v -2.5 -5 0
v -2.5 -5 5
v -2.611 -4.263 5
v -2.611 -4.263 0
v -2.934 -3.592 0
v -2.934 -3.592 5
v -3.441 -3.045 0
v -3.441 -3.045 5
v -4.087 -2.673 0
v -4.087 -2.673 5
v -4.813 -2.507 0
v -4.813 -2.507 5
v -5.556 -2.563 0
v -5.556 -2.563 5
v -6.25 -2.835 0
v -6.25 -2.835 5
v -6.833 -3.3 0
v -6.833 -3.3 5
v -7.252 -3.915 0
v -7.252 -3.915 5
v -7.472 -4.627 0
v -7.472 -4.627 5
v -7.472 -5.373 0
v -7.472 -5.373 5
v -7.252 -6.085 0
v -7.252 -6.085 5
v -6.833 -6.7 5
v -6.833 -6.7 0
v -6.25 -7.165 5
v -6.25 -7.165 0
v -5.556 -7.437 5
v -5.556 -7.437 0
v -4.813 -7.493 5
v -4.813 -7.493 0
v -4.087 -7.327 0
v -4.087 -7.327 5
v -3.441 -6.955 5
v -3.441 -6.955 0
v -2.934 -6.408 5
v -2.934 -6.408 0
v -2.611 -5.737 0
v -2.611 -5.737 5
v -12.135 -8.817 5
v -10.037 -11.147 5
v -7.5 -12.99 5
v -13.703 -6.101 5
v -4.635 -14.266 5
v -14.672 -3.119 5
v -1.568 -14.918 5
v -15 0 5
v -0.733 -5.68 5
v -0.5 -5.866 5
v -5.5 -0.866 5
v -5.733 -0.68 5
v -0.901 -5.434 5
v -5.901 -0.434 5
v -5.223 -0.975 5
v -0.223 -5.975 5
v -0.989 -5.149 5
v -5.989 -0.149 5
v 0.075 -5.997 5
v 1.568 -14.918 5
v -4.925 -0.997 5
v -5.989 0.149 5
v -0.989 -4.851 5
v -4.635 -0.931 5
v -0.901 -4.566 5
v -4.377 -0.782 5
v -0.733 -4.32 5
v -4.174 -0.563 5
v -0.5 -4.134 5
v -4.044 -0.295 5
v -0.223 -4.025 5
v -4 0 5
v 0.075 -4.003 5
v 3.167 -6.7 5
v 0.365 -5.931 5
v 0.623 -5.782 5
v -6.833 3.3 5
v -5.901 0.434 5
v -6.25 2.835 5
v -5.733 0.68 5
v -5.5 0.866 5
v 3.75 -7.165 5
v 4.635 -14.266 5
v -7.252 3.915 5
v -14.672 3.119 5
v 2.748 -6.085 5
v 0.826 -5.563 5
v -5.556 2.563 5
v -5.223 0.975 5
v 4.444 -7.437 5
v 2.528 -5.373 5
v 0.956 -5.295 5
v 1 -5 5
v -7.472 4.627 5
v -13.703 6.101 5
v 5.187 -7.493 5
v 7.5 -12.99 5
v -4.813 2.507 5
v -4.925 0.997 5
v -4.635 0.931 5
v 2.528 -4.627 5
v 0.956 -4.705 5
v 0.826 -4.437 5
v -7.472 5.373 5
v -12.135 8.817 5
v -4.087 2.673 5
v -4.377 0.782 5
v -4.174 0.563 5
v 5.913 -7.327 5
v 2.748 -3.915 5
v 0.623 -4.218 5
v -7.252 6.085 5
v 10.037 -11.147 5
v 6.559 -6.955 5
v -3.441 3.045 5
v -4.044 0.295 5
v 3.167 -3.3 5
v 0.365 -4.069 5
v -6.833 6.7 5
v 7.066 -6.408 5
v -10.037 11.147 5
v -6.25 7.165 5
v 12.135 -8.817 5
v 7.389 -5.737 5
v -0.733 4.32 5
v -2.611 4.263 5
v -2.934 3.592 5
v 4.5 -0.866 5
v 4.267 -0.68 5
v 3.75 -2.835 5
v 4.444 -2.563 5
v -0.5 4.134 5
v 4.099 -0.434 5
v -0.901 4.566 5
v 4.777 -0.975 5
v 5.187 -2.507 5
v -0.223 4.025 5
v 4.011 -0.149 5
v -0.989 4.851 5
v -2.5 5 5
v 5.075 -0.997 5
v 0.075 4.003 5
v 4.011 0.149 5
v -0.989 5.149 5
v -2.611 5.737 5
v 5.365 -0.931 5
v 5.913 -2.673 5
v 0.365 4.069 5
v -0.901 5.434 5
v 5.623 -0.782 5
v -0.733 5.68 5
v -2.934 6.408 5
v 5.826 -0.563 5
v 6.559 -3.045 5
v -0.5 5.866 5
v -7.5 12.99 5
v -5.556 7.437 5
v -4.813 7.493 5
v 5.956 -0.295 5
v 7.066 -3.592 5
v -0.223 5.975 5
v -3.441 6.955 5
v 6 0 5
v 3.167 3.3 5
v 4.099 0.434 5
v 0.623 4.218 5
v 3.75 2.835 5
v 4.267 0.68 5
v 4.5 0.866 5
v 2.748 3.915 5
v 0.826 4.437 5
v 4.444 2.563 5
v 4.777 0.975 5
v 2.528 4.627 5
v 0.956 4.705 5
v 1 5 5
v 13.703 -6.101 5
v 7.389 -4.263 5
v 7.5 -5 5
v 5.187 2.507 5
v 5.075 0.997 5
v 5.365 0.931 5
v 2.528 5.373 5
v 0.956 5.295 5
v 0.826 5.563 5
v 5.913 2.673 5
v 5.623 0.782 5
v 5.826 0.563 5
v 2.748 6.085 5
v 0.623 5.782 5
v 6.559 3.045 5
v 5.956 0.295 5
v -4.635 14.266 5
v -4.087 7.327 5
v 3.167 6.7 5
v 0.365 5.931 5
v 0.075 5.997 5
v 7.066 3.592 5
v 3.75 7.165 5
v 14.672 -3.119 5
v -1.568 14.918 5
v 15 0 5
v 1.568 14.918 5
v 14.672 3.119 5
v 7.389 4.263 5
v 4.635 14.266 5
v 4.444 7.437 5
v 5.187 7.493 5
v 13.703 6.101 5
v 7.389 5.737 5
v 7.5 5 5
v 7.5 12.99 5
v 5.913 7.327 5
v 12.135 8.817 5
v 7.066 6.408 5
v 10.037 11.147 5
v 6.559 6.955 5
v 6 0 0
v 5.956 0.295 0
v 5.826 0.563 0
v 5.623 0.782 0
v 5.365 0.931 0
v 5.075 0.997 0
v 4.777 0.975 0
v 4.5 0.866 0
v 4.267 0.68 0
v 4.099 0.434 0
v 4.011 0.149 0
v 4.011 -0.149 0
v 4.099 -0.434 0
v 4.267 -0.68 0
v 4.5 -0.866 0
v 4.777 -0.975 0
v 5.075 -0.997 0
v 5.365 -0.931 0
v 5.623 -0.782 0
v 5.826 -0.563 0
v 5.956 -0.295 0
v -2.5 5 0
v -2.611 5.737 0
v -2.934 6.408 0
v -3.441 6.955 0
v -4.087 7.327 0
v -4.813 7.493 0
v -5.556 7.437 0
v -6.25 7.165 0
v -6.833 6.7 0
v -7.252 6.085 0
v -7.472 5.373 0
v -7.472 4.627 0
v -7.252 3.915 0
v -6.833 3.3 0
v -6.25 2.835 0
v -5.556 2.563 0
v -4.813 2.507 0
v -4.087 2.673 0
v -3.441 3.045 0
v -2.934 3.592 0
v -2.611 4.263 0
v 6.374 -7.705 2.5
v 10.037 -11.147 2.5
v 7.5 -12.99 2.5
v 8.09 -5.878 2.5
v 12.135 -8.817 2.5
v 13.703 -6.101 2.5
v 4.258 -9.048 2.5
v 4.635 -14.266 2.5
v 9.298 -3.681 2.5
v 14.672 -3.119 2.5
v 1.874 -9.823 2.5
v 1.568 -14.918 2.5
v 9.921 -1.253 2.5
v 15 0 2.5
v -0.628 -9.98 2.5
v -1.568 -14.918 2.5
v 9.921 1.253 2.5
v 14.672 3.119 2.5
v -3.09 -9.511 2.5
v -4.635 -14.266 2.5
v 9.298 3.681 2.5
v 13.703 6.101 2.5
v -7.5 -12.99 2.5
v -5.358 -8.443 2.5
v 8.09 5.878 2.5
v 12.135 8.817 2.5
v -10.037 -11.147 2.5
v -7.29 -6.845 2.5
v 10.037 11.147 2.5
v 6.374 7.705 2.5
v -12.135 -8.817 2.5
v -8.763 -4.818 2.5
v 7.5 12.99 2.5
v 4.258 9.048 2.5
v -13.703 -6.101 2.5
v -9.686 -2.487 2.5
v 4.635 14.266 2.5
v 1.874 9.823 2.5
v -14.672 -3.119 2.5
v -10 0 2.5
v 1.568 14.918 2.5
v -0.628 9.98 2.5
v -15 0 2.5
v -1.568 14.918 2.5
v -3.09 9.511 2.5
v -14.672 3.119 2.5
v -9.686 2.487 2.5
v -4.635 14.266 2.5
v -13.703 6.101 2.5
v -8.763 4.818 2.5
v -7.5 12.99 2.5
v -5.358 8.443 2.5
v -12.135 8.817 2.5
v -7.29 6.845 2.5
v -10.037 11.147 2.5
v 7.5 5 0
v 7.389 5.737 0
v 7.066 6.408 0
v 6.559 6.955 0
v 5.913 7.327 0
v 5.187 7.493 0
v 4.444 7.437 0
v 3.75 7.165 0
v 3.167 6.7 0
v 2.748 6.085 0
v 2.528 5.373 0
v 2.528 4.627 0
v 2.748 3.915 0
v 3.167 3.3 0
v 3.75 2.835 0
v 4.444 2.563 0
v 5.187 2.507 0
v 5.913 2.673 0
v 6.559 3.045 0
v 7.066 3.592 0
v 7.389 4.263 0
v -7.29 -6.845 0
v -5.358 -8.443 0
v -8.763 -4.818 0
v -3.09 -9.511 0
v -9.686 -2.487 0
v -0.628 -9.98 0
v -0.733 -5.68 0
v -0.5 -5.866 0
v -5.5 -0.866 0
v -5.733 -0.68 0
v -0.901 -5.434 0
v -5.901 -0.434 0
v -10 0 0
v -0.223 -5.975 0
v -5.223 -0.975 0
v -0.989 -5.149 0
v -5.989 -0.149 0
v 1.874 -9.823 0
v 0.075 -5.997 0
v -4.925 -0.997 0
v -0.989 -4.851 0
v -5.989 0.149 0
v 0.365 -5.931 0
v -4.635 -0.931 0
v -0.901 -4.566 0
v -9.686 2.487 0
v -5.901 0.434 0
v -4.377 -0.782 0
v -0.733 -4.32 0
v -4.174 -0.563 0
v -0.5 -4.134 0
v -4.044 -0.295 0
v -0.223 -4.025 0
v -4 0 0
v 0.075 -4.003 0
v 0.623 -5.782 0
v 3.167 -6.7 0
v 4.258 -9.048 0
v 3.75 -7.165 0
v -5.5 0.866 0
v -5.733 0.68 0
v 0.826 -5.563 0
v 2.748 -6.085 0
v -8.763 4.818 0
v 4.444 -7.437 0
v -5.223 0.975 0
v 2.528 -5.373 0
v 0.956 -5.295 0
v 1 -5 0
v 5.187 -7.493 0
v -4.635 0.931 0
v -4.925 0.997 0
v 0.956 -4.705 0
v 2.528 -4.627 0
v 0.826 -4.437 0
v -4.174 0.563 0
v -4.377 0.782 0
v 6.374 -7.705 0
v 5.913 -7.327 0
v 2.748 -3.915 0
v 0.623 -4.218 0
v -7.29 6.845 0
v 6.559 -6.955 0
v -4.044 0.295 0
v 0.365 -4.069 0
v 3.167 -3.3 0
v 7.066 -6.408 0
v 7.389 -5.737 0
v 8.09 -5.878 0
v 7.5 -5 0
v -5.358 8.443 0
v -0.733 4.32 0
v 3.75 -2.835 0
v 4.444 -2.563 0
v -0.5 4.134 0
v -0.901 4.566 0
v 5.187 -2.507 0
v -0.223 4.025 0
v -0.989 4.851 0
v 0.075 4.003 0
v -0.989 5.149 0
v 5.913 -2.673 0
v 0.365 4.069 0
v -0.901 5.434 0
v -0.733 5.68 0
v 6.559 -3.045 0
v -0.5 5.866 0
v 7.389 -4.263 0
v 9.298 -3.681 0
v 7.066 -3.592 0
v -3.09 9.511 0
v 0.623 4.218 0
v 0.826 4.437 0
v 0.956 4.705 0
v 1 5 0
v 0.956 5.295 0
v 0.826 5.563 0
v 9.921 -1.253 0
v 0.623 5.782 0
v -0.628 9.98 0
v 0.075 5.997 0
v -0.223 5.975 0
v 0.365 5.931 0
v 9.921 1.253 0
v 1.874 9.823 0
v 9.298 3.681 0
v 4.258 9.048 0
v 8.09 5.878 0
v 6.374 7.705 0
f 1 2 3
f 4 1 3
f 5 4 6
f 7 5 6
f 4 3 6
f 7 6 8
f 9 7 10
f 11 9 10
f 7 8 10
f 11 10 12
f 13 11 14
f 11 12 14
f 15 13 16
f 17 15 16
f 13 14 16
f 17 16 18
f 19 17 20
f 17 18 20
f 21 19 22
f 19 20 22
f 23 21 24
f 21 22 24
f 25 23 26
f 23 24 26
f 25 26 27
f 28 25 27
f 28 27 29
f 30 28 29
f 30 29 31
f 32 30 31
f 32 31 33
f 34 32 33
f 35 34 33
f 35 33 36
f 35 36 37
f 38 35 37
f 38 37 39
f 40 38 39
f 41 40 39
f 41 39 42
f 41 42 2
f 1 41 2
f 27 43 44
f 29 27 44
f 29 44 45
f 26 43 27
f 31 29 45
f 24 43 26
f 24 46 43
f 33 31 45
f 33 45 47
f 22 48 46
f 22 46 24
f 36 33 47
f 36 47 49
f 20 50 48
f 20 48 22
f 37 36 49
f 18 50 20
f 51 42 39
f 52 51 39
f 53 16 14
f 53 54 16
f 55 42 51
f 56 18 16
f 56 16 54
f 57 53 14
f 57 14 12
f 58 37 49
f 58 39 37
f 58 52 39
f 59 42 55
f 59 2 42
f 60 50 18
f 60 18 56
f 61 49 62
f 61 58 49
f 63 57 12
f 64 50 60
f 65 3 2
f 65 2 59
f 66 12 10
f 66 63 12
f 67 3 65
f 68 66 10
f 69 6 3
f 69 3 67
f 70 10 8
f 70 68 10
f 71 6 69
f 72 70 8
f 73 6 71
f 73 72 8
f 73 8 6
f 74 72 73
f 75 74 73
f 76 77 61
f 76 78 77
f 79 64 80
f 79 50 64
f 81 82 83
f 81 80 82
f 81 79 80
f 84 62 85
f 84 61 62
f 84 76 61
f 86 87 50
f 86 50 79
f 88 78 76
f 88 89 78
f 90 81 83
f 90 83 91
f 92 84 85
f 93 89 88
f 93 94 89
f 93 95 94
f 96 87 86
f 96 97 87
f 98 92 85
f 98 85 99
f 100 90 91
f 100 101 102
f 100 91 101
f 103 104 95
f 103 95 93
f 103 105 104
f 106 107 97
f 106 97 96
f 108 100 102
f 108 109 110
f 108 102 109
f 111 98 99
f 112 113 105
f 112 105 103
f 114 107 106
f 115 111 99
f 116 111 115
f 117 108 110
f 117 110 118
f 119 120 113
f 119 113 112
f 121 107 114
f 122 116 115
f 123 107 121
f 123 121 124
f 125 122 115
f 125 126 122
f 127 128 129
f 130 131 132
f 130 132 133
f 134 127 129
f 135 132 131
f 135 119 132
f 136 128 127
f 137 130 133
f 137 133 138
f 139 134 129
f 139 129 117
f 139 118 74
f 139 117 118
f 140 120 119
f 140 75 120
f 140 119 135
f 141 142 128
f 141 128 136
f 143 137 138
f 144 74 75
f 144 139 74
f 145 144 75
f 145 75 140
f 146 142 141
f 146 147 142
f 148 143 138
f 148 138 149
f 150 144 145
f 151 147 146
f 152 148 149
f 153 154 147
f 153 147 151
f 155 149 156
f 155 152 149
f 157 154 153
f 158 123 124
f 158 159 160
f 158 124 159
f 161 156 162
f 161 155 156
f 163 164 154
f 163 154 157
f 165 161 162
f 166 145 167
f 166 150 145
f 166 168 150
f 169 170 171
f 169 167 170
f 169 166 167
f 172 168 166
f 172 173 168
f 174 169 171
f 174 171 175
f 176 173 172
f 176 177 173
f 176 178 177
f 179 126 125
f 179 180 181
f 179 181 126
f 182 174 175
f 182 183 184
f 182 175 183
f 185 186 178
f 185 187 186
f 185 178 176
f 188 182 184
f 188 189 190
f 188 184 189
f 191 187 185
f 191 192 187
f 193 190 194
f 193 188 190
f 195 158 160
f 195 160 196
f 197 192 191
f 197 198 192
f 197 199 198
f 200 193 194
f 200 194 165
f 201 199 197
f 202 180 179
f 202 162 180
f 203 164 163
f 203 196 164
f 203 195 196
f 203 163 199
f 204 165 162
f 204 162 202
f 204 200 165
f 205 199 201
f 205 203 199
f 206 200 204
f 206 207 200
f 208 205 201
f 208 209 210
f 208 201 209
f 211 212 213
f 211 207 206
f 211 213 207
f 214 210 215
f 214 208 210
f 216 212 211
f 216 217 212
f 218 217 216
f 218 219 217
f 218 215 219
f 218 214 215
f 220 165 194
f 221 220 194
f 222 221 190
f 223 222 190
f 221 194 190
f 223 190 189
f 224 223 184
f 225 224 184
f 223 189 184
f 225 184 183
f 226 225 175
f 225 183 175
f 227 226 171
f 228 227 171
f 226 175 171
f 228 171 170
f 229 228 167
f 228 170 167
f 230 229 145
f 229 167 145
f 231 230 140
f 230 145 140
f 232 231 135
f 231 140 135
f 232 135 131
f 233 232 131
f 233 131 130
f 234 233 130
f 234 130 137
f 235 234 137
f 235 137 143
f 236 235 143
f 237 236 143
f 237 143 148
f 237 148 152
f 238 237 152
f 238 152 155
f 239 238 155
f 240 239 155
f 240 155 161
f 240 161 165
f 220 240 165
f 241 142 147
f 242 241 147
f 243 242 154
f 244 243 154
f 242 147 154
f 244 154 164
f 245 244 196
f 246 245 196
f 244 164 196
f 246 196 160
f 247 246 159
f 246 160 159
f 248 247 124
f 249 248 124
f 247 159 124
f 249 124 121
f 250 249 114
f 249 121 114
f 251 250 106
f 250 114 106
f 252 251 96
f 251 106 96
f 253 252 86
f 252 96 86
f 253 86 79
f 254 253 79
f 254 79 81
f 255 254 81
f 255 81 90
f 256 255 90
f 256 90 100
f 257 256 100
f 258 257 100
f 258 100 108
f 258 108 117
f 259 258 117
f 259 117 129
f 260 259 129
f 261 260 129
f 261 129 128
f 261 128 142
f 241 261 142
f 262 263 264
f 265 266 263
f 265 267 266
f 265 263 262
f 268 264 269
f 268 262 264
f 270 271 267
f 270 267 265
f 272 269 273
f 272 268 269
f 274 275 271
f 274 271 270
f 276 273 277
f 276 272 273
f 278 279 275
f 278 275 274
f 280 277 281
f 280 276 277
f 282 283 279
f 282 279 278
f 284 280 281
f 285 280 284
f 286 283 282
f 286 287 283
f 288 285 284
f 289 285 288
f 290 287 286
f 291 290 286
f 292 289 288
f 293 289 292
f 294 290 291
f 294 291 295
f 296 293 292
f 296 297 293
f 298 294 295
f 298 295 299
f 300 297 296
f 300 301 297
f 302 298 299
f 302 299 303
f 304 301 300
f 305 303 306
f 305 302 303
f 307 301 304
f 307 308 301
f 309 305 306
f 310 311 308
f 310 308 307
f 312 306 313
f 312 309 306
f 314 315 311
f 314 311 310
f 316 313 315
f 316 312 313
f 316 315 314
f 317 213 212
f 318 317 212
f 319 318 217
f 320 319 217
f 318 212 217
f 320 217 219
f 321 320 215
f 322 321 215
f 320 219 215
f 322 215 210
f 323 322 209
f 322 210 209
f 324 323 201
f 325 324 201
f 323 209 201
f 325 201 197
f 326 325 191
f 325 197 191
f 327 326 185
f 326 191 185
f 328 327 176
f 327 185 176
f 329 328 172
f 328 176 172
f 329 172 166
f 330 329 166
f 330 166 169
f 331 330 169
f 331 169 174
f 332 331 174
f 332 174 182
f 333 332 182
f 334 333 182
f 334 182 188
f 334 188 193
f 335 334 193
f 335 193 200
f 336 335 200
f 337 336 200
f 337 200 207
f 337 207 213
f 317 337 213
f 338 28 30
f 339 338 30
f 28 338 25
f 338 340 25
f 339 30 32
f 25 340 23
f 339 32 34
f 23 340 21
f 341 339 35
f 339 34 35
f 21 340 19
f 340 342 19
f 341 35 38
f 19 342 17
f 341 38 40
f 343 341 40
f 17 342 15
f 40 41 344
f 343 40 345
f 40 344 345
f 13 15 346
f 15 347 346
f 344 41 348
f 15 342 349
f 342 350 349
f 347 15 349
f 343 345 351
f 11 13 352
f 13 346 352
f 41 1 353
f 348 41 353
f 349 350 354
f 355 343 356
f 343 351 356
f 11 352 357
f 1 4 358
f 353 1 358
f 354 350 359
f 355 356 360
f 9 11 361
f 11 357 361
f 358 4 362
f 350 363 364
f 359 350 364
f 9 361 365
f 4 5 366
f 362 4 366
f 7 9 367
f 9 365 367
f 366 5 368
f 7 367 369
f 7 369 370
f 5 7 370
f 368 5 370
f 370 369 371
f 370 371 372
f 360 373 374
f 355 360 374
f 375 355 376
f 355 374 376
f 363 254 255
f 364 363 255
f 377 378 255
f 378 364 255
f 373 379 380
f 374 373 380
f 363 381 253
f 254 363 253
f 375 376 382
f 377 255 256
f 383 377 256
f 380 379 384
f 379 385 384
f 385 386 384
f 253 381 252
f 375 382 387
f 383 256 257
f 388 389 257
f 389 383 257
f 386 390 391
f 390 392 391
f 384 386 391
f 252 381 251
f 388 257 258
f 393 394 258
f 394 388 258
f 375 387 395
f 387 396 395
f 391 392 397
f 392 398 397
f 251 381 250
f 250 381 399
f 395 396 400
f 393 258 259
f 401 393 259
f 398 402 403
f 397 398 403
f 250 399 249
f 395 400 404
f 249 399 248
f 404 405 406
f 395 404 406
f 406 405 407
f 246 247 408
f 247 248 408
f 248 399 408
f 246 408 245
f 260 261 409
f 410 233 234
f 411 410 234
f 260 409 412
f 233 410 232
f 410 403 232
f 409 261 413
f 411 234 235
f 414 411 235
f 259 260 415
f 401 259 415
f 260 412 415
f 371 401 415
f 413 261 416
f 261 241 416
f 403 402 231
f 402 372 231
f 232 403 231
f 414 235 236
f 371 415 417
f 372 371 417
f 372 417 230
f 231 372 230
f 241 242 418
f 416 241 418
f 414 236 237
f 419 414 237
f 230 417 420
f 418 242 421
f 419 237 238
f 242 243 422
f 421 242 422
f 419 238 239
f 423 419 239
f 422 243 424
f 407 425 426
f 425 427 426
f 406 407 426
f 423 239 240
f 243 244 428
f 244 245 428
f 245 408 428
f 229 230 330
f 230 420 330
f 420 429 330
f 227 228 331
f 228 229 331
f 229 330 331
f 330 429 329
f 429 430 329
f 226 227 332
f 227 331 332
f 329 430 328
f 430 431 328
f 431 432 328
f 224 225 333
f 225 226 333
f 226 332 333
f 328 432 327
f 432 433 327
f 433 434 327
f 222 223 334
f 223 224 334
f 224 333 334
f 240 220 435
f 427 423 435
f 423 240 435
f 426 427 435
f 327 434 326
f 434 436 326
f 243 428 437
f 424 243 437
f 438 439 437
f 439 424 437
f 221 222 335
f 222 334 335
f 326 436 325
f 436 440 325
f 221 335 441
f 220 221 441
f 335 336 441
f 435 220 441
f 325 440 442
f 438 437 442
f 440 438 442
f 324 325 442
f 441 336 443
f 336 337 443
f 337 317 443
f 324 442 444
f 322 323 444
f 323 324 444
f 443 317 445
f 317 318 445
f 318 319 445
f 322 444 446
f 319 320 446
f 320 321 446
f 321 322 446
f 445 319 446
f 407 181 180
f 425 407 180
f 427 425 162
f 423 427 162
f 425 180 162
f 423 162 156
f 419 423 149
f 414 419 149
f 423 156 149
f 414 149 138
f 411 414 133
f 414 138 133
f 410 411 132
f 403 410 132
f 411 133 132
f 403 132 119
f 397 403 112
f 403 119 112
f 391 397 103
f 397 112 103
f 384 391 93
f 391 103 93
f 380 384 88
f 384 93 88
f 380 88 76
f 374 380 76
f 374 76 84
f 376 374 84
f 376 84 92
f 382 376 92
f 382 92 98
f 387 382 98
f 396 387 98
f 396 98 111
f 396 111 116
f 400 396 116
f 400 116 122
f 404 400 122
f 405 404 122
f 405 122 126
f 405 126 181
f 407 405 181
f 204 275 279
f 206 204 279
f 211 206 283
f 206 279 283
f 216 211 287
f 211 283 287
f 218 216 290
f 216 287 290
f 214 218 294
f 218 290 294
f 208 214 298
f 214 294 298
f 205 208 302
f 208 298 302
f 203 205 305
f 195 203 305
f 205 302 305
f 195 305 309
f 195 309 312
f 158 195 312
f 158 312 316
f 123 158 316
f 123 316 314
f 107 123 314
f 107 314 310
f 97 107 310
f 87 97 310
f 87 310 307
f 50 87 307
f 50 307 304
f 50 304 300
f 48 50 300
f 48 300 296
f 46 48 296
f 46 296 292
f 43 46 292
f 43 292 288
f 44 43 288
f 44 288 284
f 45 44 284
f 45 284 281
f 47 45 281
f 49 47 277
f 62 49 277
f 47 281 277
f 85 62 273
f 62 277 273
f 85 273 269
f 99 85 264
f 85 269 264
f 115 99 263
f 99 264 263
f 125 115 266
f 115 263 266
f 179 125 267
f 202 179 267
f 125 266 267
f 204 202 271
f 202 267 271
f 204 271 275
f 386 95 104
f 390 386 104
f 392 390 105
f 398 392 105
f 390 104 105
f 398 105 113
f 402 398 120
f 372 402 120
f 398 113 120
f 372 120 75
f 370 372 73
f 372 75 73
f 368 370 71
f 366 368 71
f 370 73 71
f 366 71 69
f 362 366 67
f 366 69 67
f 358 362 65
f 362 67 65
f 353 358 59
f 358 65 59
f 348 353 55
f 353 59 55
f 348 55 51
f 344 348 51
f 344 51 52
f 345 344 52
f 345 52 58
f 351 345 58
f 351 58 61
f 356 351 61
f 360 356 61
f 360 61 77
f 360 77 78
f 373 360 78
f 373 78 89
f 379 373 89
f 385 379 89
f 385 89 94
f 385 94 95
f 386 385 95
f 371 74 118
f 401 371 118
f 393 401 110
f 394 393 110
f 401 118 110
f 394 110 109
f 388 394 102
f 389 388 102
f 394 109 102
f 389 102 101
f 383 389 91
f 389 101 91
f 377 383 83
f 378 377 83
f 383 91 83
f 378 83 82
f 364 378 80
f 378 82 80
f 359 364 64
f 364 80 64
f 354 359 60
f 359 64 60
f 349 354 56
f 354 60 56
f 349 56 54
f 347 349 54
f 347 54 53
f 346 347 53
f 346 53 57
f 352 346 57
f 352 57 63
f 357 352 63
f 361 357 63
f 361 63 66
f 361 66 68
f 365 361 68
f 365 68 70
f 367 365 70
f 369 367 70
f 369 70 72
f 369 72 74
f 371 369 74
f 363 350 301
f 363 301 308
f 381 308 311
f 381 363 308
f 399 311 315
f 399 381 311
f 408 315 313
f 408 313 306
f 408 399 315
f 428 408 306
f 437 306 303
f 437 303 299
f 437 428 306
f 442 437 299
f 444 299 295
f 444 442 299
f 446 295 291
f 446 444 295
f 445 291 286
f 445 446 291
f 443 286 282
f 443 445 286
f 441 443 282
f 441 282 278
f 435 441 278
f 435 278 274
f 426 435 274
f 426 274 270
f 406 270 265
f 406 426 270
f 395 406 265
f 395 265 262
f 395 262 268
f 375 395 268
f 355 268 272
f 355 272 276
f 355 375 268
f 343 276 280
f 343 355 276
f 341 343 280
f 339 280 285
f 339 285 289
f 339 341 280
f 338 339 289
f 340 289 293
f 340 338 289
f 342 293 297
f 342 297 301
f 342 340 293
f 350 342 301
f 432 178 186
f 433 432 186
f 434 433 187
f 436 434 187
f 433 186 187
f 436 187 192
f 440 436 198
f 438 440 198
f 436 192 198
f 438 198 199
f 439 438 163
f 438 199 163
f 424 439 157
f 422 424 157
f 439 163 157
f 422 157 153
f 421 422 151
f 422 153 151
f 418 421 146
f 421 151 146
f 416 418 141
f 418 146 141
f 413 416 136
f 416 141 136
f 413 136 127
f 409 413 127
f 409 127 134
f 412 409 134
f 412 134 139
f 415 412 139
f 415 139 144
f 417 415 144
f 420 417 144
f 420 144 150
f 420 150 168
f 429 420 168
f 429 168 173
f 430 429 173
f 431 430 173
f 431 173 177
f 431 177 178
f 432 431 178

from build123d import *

# Parameters (mm, degrees)
SKETCH1_R              = 15
BODY_DEPTH             = 5
SKETCH2_R              = 15
SKETCH2_R_2            = 10
SLEW_BEARING_LIP_DEPTH = 2.5
SKETCH3_R              = 2.5
CUT_EXTRUDE2_DEPTH     = 22.794494718
SKETCH4_R              = 1
CUT_EXTRUDE3_DEPTH     = 22.794494718


with BuildPart() as part:
    # Sketch1 → body (new body)
    with BuildSketch(Plane.XY):
        Circle(SKETCH1_R)
    extrude(amount=BODY_DEPTH)

    # Sketch2 → slew bearing lip (cut)
    with BuildSketch(Plane(origin=(0, 0, 0), x_dir=(-1, 0, 0), z_dir=(0, 0, -1))):
        Circle(SKETCH2_R)
        Circle(SKETCH2_R_2, mode=Mode.SUBTRACT)
    extrude(amount=-SLEW_BEARING_LIP_DEPTH, mode=Mode.SUBTRACT)

    # Sketch3 → Cut-Extrude2 (cut, through all)
    with BuildSketch(Plane.XY.offset(5)):
        with Locations((-5, 5)):
            Circle(SKETCH3_R)
        with Locations((5, 5)):
            Circle(SKETCH3_R)
        with Locations((5, -5)):
            Circle(SKETCH3_R)
        with Locations((-5, -5)):
            Circle(SKETCH3_R)
    extrude(amount=-CUT_EXTRUDE2_DEPTH, mode=Mode.SUBTRACT)

    # Sketch4 → Cut-Extrude3 (cut, through all)
    with BuildSketch(Plane.XY.offset(5)):
        with Locations((0, 5)):
            Circle(SKETCH4_R)
        with Locations((5, 0)):
            Circle(SKETCH4_R)
        with Locations((0, -5)):
            Circle(SKETCH4_R)
        with Locations((-5, 0)):
            Circle(SKETCH4_R)
    extrude(amount=-CUT_EXTRUDE3_DEPTH, mode=Mode.SUBTRACT)


solid = part.part
